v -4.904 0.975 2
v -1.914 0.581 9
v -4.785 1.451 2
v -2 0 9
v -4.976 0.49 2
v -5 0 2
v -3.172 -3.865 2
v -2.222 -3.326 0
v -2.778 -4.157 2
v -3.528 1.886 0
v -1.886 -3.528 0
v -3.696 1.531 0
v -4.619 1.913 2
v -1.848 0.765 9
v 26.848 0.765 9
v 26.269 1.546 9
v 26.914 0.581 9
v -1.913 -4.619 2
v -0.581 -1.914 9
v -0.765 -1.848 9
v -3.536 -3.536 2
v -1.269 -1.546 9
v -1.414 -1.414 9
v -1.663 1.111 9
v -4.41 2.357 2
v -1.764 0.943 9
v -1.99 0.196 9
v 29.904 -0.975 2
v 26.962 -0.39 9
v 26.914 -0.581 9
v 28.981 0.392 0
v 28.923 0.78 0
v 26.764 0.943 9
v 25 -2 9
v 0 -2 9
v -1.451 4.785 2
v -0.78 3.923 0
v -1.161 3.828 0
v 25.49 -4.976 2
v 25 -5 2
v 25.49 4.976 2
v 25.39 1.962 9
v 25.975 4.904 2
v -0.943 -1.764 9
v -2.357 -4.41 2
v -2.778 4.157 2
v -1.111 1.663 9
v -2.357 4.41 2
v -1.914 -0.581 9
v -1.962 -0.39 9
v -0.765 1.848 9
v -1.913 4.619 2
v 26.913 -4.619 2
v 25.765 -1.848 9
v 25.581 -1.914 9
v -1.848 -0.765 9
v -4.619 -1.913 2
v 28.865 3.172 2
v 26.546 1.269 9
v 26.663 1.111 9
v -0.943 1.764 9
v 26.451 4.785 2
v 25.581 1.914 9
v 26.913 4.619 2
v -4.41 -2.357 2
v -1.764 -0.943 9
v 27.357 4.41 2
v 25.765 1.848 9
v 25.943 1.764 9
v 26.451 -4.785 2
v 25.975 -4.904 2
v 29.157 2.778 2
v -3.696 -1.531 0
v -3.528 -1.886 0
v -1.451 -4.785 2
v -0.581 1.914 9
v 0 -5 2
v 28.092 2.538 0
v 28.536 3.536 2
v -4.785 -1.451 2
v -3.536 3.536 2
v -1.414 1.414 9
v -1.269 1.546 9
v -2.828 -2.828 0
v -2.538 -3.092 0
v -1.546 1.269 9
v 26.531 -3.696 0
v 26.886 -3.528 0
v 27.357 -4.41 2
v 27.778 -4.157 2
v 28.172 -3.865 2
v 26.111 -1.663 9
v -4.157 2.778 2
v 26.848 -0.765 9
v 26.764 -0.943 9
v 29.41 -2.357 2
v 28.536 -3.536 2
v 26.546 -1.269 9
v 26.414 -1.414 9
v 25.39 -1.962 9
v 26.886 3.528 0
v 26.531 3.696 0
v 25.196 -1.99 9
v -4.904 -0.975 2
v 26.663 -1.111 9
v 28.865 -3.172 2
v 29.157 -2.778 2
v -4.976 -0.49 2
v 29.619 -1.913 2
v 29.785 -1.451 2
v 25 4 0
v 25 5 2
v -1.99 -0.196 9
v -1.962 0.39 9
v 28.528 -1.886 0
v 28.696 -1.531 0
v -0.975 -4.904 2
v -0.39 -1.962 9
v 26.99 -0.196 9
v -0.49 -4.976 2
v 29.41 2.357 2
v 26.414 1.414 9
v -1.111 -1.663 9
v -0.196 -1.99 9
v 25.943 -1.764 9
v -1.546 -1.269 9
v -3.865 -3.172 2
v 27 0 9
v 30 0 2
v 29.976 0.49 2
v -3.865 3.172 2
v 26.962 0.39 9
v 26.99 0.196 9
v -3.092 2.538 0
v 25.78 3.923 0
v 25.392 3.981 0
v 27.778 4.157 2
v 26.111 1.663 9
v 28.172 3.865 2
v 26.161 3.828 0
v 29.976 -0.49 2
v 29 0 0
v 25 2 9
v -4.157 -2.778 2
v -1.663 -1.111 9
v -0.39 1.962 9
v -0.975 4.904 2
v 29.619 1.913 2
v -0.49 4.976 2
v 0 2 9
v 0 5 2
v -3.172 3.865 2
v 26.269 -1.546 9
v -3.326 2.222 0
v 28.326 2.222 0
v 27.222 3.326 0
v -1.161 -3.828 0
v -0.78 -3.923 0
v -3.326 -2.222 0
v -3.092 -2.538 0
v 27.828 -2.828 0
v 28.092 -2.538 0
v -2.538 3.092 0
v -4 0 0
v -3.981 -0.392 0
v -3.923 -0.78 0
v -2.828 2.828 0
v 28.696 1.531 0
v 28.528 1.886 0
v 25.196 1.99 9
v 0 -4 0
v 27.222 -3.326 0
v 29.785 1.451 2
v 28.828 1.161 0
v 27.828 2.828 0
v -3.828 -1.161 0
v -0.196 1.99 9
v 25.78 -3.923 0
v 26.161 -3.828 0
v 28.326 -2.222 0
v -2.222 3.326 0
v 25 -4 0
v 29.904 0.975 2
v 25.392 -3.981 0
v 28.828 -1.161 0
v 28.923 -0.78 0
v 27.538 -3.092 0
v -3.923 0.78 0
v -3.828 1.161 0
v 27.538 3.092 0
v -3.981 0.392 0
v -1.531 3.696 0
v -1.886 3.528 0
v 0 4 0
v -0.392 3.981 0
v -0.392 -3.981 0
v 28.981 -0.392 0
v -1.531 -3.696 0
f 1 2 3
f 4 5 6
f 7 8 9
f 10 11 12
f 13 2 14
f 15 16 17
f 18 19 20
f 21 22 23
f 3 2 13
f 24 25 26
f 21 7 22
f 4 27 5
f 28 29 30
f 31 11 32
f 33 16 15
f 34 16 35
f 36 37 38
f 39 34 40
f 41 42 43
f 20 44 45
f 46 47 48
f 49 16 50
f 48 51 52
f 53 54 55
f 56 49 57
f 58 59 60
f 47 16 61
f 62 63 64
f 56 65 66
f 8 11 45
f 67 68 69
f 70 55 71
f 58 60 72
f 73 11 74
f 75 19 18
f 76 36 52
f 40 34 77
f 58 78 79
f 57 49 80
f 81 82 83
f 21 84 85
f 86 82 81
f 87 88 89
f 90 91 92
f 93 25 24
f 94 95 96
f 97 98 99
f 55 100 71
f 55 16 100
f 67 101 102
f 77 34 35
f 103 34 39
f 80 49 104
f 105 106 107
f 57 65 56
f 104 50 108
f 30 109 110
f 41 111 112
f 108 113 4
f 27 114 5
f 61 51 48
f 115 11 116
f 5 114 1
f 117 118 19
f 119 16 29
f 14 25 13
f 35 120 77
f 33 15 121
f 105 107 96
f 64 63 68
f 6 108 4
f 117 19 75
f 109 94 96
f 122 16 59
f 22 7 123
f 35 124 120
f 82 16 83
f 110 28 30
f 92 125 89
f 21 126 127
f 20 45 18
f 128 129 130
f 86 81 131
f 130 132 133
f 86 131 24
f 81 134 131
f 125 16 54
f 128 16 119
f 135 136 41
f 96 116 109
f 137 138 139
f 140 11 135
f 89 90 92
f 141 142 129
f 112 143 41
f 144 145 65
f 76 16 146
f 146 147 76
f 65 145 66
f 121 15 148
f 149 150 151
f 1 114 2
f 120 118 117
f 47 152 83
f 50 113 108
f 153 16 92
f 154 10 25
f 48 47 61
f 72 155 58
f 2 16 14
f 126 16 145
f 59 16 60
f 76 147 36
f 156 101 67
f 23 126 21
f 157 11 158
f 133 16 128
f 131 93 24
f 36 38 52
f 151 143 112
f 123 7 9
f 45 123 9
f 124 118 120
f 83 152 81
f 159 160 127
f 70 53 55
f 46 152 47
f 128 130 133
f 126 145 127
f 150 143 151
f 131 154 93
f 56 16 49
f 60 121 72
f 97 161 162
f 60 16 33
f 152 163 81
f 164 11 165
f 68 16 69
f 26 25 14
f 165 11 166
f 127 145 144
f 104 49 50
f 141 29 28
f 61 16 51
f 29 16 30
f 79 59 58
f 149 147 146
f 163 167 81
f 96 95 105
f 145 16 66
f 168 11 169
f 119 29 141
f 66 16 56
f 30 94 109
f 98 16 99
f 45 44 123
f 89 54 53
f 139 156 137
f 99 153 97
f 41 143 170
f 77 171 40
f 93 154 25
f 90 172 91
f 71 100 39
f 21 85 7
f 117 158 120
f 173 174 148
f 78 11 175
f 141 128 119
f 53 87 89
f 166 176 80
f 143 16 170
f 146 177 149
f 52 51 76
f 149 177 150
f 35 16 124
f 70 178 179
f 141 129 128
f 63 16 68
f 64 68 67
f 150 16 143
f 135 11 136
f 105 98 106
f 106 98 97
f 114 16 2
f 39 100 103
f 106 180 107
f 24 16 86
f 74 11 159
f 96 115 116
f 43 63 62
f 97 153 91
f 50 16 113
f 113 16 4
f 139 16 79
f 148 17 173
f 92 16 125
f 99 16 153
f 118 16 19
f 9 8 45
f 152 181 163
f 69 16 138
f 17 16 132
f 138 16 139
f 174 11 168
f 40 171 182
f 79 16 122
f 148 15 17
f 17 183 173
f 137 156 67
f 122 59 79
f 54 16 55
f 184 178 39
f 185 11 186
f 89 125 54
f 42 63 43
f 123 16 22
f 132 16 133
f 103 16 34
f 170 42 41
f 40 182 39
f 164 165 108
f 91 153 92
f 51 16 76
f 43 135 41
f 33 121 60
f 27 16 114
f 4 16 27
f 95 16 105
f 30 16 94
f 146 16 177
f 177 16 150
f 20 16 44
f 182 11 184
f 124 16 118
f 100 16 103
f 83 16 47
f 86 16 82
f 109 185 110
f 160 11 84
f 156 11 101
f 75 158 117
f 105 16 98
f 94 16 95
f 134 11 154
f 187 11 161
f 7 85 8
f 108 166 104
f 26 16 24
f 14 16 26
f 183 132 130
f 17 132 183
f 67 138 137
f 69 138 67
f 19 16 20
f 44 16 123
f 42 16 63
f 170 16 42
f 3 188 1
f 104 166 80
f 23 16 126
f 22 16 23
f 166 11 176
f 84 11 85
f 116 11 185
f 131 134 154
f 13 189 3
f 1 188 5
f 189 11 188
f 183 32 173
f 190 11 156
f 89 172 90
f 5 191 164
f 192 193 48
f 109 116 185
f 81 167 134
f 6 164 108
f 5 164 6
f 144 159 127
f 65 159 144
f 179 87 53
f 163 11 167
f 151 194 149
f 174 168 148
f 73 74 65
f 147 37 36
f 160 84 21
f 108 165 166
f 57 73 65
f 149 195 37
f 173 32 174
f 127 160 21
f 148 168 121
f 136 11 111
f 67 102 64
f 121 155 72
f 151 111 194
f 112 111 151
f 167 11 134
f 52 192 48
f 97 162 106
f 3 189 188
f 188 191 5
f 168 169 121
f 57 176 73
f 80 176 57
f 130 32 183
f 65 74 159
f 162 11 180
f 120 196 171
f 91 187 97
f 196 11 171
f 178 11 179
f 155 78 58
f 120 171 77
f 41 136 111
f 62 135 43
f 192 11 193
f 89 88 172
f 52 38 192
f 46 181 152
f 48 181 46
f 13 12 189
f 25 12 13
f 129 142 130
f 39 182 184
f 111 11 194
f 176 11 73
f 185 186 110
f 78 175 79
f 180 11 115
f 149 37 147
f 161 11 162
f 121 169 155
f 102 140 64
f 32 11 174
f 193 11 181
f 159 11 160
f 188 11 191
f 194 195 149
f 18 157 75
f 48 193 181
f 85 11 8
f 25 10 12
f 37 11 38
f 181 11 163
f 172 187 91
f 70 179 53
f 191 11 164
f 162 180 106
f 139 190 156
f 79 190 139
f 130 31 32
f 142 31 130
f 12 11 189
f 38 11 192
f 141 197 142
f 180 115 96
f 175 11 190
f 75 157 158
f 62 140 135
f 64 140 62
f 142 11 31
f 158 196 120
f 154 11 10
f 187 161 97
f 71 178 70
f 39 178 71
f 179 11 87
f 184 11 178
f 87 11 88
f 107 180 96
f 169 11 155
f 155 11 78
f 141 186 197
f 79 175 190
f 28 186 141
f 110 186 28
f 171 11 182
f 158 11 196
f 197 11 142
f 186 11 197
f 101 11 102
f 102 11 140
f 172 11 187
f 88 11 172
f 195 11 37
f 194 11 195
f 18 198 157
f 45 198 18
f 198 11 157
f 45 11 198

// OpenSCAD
hull() for (x = [0, 25]) translate([x, 0, 0]) rotate_extrude($fn = 64) polygon([[0, 0], [4, 0], [5, 2], [3, 6], [2, 9], [0, 9]]);
